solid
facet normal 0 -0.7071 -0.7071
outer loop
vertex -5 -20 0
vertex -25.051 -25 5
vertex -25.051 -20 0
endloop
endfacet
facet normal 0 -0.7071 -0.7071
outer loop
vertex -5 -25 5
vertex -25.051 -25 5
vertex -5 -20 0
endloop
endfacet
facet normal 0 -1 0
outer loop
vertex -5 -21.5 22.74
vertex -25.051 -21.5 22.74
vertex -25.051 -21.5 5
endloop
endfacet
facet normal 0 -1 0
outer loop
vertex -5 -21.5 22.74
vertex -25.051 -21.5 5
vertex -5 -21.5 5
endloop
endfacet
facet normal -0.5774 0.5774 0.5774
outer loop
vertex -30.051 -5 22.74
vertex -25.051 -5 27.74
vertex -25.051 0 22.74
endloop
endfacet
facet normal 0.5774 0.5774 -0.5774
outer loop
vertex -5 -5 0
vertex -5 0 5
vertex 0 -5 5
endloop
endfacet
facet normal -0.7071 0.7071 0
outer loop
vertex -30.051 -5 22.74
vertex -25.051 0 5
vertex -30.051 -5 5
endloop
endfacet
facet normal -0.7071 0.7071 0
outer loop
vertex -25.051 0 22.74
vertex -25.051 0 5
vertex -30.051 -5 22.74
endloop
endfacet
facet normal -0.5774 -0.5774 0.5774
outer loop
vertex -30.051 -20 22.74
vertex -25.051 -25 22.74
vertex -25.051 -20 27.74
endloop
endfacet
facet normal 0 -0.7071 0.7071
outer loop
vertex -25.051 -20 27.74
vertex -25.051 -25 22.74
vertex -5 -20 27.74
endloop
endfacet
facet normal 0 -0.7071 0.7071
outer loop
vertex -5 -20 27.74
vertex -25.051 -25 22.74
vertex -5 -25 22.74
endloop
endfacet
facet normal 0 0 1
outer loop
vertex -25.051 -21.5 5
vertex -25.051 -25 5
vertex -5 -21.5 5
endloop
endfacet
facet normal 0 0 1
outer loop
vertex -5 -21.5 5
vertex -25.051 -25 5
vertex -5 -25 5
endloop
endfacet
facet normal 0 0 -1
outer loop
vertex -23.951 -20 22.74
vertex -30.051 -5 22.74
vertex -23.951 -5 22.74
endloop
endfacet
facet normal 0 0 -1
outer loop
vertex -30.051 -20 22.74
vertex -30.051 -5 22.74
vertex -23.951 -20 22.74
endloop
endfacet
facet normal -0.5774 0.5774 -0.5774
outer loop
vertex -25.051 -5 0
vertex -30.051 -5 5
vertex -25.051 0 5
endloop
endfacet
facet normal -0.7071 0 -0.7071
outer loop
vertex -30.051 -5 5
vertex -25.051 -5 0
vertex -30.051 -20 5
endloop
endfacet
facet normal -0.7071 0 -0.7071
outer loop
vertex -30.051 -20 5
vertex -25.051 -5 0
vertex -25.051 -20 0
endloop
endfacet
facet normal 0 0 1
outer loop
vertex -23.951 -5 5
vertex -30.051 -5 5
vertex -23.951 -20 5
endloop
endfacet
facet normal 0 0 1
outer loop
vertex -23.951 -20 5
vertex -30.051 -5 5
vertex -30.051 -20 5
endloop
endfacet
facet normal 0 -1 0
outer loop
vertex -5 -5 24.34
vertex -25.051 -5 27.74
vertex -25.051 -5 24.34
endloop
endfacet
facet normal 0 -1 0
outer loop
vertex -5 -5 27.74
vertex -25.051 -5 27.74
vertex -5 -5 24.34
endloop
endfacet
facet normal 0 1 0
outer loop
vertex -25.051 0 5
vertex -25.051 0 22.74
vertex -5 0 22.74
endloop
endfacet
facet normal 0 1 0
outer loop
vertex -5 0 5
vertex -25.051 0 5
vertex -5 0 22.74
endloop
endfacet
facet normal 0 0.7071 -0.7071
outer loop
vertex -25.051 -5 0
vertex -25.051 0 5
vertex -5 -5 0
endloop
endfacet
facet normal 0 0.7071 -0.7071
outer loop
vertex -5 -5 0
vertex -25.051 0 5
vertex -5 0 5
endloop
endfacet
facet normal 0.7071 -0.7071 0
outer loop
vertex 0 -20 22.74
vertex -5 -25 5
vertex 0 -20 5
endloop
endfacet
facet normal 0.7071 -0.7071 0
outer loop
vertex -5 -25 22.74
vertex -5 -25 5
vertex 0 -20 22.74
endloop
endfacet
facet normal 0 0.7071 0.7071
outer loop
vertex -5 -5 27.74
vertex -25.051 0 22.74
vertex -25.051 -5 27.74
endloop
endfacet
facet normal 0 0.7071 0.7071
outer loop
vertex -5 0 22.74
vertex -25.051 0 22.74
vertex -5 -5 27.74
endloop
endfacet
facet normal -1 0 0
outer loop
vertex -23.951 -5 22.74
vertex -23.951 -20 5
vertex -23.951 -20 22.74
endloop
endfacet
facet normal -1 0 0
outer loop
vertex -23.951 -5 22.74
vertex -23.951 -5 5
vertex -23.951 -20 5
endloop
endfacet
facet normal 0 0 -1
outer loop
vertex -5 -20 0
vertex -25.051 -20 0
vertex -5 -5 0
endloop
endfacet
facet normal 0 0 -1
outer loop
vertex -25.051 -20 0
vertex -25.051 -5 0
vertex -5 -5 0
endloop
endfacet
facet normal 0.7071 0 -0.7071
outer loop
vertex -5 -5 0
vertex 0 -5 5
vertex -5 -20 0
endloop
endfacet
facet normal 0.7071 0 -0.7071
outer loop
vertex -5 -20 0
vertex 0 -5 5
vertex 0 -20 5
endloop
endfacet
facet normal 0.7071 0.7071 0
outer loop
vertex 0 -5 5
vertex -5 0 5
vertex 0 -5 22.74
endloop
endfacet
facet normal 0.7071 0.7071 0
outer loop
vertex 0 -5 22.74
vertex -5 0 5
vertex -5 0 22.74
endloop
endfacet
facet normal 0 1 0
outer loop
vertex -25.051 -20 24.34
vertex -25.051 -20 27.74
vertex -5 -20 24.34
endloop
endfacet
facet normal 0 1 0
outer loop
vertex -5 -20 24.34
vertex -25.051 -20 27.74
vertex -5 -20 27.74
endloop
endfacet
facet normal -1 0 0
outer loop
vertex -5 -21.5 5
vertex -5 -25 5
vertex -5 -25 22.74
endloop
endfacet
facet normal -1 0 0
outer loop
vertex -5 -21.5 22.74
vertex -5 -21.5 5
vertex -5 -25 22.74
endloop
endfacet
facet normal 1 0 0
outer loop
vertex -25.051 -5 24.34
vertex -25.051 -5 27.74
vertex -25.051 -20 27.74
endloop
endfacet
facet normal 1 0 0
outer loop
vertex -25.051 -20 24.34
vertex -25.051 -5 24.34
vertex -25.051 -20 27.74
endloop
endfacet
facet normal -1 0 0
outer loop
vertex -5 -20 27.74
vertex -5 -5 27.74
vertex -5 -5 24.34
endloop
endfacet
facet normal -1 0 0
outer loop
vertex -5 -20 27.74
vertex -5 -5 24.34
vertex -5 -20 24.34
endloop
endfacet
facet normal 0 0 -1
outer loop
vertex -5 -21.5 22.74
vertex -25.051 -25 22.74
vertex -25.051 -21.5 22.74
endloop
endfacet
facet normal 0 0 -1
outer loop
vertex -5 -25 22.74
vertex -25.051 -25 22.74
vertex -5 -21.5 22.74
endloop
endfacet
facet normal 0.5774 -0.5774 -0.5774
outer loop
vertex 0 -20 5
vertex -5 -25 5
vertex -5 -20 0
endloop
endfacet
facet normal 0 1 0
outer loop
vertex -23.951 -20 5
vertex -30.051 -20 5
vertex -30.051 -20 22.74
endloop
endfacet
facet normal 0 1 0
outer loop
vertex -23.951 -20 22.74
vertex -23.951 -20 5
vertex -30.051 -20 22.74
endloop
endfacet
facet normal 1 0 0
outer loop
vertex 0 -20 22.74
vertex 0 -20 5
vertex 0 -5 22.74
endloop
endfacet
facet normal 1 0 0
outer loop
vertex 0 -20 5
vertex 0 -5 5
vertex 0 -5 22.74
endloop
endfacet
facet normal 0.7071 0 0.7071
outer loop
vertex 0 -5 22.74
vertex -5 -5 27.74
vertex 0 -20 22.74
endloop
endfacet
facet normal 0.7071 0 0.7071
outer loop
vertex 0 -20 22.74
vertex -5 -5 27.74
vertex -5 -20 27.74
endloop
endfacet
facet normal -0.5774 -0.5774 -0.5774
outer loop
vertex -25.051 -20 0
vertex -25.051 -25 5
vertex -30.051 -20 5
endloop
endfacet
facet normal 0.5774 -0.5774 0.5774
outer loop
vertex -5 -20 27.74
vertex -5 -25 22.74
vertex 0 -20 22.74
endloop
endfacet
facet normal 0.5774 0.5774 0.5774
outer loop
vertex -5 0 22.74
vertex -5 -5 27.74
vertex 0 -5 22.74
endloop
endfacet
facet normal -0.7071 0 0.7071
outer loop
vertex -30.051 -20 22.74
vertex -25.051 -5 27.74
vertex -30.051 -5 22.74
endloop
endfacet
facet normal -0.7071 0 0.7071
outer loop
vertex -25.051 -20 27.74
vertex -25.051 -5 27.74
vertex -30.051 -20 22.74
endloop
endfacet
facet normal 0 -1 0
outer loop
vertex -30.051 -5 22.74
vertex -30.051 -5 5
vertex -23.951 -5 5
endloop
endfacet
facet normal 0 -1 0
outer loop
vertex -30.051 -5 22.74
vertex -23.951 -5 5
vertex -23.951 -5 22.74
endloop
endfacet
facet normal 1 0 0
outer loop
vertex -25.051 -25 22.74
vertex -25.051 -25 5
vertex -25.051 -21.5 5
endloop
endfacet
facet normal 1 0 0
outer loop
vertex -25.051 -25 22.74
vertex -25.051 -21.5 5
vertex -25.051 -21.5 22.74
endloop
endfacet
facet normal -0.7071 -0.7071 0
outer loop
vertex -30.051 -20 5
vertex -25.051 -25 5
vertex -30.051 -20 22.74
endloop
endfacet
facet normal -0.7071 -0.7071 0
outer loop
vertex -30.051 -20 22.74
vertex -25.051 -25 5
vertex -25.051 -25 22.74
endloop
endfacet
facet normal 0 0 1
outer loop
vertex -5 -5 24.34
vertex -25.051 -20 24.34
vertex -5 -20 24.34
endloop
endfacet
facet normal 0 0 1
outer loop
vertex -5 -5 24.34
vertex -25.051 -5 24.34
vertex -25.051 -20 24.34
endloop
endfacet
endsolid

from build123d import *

# Parameters (mm, degrees)
F0_W     = 30.0513710827
F0_H     = 27.739726007
F1_DEPTH = 25
F2_SIZE  = 5
F3_DEPTH = 6.1
F4_DEPTH = 3.4
F5_DEPTH = 3.5


with BuildPart() as f1:
    # F0 (on Front) → F1 (new body)
    with BuildSketch(Plane.XZ):
        with Locations((-15.0256855413, 13.8698630035)):
            Rectangle(F0_W, F0_H)
    extrude(amount=F1_DEPTH)

    # F2
    f2_edges = [f1.edges().sort_by_distance(p)[0] for p in [
        (-15.025686, -25, 27.739726),
        (0, -25, 13.869863),
        (-15.025686, -25, 0),
        (-30.051371, -25, 13.869863),
        (-30.051371, -12.5, 27.739726),
        (0, -12.5, 27.739726),
        (-15.025686, 0, 27.739726),
        (0, 0, 13.869863),
        (-30.051371, 0, 13.869863),
        (-30.051371, -12.5, 0),
        (-15.025686, 0, 0),
        (0, -12.5, 0),
    ]]
    chamfer(f2_edges, length=F2_SIZE)

    # F3 (cut): a face of the model
    f3_faces = [f1.faces().sort_by_distance(p)[0] for p in [
        (-30.0513710827, -12.5, 13.8698630035),
    ]]
    extrude(f3_faces, amount=-F3_DEPTH, mode=Mode.SUBTRACT)

    # F4 (cut): a face of the model
    f4_faces = [f1.faces().sort_by_distance(p)[0] for p in [
        (-15.0256855413, -12.5, 27.739726007),
    ]]
    extrude(f4_faces, amount=-F4_DEPTH, mode=Mode.SUBTRACT)

    # F5 (cut): a face of the model
    f5_faces = [f1.faces().sort_by_distance(p)[0] for p in [
        (-15.0256855413, -25, 13.8698630035),
    ]]
    extrude(f5_faces, amount=-F5_DEPTH, mode=Mode.SUBTRACT)


solid = f1.part
